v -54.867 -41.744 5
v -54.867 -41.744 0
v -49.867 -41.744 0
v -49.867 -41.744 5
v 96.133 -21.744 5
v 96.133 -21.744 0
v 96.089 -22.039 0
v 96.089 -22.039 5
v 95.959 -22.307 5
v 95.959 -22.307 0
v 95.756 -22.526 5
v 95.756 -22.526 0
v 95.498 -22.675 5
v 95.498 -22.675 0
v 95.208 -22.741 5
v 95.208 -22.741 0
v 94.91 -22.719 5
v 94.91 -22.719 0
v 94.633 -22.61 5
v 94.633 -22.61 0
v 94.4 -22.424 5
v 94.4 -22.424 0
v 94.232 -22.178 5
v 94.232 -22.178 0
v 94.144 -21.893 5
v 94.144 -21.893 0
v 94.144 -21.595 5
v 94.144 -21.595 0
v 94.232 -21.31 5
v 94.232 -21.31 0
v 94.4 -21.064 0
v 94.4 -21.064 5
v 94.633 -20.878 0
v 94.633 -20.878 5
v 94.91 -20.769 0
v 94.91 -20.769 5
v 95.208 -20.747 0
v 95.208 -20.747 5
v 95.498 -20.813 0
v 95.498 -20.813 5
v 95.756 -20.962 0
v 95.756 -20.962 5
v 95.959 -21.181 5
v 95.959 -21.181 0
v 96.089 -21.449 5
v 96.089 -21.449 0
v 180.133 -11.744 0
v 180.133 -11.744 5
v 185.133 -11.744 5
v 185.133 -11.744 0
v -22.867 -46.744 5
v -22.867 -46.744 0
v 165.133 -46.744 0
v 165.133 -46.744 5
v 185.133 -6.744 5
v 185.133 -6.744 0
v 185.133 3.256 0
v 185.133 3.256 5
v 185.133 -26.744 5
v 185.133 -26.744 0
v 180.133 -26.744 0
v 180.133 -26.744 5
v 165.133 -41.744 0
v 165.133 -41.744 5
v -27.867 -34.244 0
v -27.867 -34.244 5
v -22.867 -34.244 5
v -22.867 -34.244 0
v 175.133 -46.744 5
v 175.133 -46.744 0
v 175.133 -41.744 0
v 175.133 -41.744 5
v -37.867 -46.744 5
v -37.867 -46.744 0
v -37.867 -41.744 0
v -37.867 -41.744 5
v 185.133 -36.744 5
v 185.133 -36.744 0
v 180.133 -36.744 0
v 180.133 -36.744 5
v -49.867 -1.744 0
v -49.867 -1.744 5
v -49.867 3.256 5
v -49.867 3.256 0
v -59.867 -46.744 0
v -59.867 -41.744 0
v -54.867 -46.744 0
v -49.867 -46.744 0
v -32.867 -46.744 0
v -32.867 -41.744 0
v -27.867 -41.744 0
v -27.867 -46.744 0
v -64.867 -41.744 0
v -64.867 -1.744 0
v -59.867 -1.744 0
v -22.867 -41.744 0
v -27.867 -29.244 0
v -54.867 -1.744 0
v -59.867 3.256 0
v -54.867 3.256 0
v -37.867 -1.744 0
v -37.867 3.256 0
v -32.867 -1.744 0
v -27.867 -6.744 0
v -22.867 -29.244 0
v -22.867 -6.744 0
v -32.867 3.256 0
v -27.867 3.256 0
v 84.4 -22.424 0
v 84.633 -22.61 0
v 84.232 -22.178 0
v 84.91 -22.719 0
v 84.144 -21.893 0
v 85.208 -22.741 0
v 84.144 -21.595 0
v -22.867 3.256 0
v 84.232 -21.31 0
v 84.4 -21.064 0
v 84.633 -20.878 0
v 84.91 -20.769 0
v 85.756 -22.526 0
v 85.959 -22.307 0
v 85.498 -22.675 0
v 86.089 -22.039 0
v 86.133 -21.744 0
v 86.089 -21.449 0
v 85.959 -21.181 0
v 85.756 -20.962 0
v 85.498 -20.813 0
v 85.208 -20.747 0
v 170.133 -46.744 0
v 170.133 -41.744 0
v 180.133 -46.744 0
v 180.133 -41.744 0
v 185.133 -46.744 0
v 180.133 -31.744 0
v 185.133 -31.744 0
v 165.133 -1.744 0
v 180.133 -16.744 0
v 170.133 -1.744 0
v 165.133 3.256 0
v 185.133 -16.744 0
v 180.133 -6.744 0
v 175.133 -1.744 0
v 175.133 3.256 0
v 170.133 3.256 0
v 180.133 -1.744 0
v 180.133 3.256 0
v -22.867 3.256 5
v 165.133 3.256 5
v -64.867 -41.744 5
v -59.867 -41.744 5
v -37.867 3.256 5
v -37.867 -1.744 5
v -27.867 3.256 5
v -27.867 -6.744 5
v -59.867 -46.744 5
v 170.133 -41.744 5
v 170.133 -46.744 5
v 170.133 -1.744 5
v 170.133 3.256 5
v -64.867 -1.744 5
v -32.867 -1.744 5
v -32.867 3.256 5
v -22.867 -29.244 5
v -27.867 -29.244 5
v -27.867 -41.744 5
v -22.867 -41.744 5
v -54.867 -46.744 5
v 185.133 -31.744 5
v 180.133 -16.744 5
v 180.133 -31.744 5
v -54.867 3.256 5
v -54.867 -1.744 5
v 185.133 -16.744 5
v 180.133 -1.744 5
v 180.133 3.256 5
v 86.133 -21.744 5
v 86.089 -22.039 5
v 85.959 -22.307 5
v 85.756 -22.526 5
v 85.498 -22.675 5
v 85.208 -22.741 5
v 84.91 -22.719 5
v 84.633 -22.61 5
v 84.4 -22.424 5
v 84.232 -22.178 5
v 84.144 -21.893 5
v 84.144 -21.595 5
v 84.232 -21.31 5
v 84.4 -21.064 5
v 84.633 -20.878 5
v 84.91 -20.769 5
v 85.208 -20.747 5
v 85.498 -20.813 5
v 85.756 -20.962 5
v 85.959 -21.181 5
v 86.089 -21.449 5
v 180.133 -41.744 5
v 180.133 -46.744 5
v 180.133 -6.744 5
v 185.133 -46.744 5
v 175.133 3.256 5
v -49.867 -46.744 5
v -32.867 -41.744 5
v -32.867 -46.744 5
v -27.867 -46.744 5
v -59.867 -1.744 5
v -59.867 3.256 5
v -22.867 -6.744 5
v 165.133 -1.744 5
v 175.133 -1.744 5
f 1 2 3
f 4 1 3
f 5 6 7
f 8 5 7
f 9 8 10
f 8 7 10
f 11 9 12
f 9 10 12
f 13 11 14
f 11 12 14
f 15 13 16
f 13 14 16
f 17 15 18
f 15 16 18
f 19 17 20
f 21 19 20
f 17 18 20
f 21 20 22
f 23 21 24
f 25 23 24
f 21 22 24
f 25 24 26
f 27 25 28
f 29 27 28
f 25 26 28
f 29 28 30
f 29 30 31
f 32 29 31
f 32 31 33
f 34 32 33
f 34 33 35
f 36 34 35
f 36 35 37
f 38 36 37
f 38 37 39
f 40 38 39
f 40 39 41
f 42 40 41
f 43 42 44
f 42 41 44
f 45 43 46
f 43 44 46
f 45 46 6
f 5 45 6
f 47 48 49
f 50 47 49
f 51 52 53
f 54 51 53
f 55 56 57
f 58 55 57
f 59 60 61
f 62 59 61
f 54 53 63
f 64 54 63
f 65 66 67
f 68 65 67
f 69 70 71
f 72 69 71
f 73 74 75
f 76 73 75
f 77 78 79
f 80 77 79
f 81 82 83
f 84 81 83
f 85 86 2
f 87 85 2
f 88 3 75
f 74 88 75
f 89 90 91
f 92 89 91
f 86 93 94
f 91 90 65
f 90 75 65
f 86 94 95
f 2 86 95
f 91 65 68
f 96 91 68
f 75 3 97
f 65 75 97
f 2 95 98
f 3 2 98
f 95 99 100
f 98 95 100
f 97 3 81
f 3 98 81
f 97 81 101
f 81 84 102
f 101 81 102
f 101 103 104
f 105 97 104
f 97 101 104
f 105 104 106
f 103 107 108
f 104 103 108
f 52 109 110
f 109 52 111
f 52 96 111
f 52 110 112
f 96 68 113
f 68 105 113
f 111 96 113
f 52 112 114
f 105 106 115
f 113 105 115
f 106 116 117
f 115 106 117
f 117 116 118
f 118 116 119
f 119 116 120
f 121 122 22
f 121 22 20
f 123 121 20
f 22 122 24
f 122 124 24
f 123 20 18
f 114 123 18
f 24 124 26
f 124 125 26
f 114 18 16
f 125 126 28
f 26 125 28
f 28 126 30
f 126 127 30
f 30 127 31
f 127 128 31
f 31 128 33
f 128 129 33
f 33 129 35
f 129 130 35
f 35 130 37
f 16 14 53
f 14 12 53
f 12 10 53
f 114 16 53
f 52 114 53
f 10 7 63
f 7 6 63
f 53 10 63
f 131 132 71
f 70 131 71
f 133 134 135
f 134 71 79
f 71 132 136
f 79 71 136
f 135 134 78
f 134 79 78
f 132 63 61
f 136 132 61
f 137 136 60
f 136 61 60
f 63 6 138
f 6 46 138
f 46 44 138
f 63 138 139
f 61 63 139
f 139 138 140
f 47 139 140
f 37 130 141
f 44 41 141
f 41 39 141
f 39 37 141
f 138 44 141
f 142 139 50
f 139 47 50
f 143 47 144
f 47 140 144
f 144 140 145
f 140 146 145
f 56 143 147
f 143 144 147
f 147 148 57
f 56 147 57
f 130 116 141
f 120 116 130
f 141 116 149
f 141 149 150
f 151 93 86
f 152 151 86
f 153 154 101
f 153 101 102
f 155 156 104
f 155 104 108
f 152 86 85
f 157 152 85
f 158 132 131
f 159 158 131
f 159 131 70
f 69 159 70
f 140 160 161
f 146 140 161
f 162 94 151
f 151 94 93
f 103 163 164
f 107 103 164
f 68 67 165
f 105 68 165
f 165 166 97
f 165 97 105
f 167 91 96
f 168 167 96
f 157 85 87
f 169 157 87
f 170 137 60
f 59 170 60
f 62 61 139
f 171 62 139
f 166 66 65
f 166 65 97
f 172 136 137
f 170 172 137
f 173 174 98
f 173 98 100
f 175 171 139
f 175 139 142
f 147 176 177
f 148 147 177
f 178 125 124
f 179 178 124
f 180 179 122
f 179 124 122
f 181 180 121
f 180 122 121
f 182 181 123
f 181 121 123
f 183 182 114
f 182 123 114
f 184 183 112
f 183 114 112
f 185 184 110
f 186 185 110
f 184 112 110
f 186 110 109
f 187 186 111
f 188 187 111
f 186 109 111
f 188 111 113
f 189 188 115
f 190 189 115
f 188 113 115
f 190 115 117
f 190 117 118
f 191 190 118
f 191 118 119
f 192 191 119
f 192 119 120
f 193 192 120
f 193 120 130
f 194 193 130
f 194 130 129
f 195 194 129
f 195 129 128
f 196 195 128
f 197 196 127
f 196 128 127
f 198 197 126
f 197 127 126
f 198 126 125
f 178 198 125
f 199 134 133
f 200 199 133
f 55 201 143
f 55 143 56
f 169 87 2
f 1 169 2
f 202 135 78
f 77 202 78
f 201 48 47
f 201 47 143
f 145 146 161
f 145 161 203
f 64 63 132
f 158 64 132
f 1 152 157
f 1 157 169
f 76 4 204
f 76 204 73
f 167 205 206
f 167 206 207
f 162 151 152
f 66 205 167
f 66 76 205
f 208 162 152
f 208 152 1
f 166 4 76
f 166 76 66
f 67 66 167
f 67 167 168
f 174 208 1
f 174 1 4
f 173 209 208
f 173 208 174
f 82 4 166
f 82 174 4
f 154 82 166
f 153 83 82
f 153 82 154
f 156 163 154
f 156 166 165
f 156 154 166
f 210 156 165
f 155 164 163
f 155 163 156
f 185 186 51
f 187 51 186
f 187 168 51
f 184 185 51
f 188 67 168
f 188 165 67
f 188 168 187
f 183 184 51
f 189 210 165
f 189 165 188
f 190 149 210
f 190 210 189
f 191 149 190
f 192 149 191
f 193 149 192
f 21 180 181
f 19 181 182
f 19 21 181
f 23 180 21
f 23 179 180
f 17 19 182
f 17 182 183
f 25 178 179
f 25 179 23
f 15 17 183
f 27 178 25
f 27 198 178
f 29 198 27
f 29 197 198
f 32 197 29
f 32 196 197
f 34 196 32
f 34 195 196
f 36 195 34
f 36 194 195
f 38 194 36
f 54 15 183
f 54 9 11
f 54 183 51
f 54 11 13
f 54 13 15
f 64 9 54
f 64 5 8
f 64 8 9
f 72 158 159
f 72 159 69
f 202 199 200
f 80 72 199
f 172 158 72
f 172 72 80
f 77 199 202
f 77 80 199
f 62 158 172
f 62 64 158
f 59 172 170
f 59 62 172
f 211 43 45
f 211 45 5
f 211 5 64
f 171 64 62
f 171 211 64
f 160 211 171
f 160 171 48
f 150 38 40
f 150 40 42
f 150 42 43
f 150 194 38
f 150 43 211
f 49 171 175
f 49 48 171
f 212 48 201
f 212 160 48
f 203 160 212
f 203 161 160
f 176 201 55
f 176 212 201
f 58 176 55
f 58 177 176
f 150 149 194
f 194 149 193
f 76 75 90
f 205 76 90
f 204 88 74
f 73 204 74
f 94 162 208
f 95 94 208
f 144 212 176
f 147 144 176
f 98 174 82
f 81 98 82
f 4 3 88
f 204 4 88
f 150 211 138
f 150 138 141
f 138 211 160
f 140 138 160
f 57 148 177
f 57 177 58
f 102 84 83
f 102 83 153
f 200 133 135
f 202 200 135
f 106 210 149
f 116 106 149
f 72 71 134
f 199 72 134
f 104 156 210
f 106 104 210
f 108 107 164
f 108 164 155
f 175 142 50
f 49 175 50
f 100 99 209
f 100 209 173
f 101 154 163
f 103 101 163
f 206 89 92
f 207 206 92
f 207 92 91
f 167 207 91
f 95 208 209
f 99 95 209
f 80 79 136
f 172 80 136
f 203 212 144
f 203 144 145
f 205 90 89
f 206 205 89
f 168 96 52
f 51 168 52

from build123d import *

# Parameters (mm, degrees)
ESQUISSE1_W              = 250
ESQUISSE1_H              = 25
BOSS_EXTRU_1_DEPTH       = 5
ESQUISSE2_W              = 5
ESQUISSE2_H              = 5
ENL_V_MAT_EXTRU_1_DEPTH  = 5
SYM_TRIE1_DEPTH          = 5
ESQUISSE3_W              = 5
ESQUISSE3_H              = 5
ENL_V_MAT_EXTRU_14_DEPTH = 5


# Read off the part's stored shape, not the designer's step: Symétrie1
with BuildPart() as part:
    # Esquisse1 → Boss.-Extru.1 (new body)
    with BuildSketch(Plane.XY):
        with Locations((60.132935366, -9.243939394)):
            Rectangle(ESQUISSE1_W, ESQUISSE1_H)
    extrude(amount=BOSS_EXTRU_1_DEPTH)

    # Esquisse2 → Enlèv. mat.-Extru.1 (cut)
    with BuildSketch(Plane.XY.offset(5)):
        with Locations((177.632935366, 0.756060606)):
            Rectangle(ESQUISSE2_W, ESQUISSE2_H)
        with Locations((167.632935366, 0.756060606)):
            Rectangle(ESQUISSE2_W, ESQUISSE2_H)
        with Locations((-25.367064634, 0.756060606)):
            Rectangle(ESQUISSE2_W, ESQUISSE2_H)
        with Locations((-35.367064634, 0.756060606)):
            Rectangle(ESQUISSE2_W, ESQUISSE2_H)
        with Locations((-52.367064634, 0.756060606)):
            Rectangle(ESQUISSE2_W, ESQUISSE2_H)
        with Locations((-62.367064634, 0.756060606)):
            Rectangle(ESQUISSE2_W, ESQUISSE2_H)
        with Locations((182.632935366, -9.243939394)):
            Rectangle(ESQUISSE2_W, ESQUISSE2_H)
        with Locations((182.632935366, -19.243939394)):
            Rectangle(ESQUISSE2_W, ESQUISSE2_H)
        with BuildLine():
            Line((84.132935366, -21.743939394), (85.132935366, -21.743939394))
            Line((85.132935366, -21.743939394), (86.132935366, -21.743939394))
            ThreePointArc((86.132935366, -21.743939394), (85.132935366, -20.743939394), (84.132935366, -21.743939394))
        make_face()
        with BuildLine():
            Line((94.132935366, -21.743939394), (95.132935366, -21.743939394))
            Line((95.132935366, -21.743939394), (96.132935366, -21.743939394))
            ThreePointArc((96.132935366, -21.743939394), (95.132935366, -20.743939394), (94.132935366, -21.743939394))
        make_face()
    extrude(amount=-ENL_V_MAT_EXTRU_1_DEPTH, mode=Mode.SUBTRACT)

    # Symétrie1 outline → Symétrie1 (add)
    with BuildSketch(Plane.XY):
        with BuildLine():
            Line((180.132935366, -31.743939394), (185.132935366, -31.743939394))
            Line((185.132935366, -31.743939394), (185.132935366, -26.743939394))
            Line((185.132935366, -26.743939394), (180.132935366, -26.743939394))
            Line((180.132935366, -26.743939394), (180.132935366, -21.743939394))
            Line((180.132935366, -21.743939394), (96.132935366, -21.743939394))
            ThreePointArc((96.132935366, -21.743939394), (95.132935366, -22.743939394), (94.132935366, -21.743939394))
            Line((94.132935366, -21.743939394), (86.132935366, -21.743939394))
            ThreePointArc((86.132935366, -21.743939394), (85.132935366, -22.743939394), (84.132935366, -21.743939394))
            Line((84.132935366, -21.743939394), (-64.867064634, -21.743939394))
            Line((-64.867064634, -21.743939394), (-64.867064634, -41.743939394))
            Line((-64.867064634, -41.743939394), (-59.867064634, -41.743939394))
            Line((-59.867064634, -41.743939394), (-59.867064634, -46.743939394))
            Line((-59.867064634, -46.743939394), (-54.867064634, -46.743939394))
            Line((-54.867064634, -46.743939394), (-54.867064634, -41.743939394))
            Line((-54.867064634, -41.743939394), (-49.867064634, -41.743939394))
            Line((-49.867064634, -41.743939394), (-49.867064634, -46.743939394))
            Line((-49.867064634, -46.743939394), (-37.867064634, -46.743939394))
            Line((-37.867064634, -46.743939394), (-37.867064634, -41.743939394))
            Line((-37.867064634, -41.743939394), (-32.867064634, -41.743939394))
            Line((-32.867064634, -41.743939394), (-32.867064634, -46.743939394))
            Line((-32.867064634, -46.743939394), (-27.867064634, -46.743939394))
            Line((-27.867064634, -46.743939394), (-27.867064634, -41.743939394))
            Line((-27.867064634, -41.743939394), (-22.867064634, -41.743939394))
            Line((-22.867064634, -41.743939394), (-22.867064634, -46.743939394))
            Line((-22.867064634, -46.743939394), (165.132935366, -46.743939394))
            Line((165.132935366, -46.743939394), (165.132935366, -41.743939394))
            Line((165.132935366, -41.743939394), (170.132935366, -41.743939394))
            Line((170.132935366, -41.743939394), (170.132935366, -46.743939394))
            Line((170.132935366, -46.743939394), (175.132935366, -46.743939394))
            Line((175.132935366, -46.743939394), (175.132935366, -41.743939394))
            Line((175.132935366, -41.743939394), (180.132935366, -41.743939394))
            Line((180.132935366, -41.743939394), (180.132935366, -46.743939394))
            Line((180.132935366, -46.743939394), (185.132935366, -46.743939394))
            Line((185.132935366, -46.743939394), (185.132935366, -36.743939394))
            Line((185.132935366, -36.743939394), (180.132935366, -36.743939394))
            Line((180.132935366, -36.743939394), (180.132935366, -31.743939394))
        make_face()
    extrude(amount=SYM_TRIE1_DEPTH)

    # Esquisse3 → Enlèv. mat.-Extru.14 (cut)
    with BuildSketch(Plane.XY.offset(5)):
        with Locations((-25.367064634, -4.243939394)):
            Rectangle(ESQUISSE3_W, ESQUISSE3_H)
        with Locations((-25.367064634, -31.743939394)):
            Rectangle(ESQUISSE3_W, ESQUISSE3_H)
    extrude(amount=-ENL_V_MAT_EXTRU_14_DEPTH, mode=Mode.SUBTRACT)


solid = part.part
